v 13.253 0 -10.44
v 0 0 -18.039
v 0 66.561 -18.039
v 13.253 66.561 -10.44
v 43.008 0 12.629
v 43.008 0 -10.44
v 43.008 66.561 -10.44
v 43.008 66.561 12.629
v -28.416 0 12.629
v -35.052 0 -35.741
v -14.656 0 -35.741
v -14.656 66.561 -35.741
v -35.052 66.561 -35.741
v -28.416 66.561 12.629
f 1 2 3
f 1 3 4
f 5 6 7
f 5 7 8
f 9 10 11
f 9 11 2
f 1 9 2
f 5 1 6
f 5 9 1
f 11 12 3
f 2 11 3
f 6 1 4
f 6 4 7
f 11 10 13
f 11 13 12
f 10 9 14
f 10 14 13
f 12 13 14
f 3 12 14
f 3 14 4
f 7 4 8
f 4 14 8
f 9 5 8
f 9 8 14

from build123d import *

# Parameters (mm, degrees)
F1_DEPTH = 66.5611065924


# Not quite as in the source:
# - the program builds the solid bodies; features that only make, move or delete a surface that nothing else refers to are left out


with BuildPart() as f1:
    # F0 (on Front) → F1 (new body)
    with BuildSketch(Plane.XZ):
        Polygon((-28.4163840115, 12.6286381856), (-35.0520461798, -35.7411280274), (-14.6560901776, -35.7411280274), (0, -18.0393829942), (13.2530285046, -10.4401372373), (43.007966131, -10.4401372373), (43.007966131, 12.6286381856), (-11.0137574375, 12.6286381856), align=None)
    extrude(amount=-F1_DEPTH)


solid = f1.part
